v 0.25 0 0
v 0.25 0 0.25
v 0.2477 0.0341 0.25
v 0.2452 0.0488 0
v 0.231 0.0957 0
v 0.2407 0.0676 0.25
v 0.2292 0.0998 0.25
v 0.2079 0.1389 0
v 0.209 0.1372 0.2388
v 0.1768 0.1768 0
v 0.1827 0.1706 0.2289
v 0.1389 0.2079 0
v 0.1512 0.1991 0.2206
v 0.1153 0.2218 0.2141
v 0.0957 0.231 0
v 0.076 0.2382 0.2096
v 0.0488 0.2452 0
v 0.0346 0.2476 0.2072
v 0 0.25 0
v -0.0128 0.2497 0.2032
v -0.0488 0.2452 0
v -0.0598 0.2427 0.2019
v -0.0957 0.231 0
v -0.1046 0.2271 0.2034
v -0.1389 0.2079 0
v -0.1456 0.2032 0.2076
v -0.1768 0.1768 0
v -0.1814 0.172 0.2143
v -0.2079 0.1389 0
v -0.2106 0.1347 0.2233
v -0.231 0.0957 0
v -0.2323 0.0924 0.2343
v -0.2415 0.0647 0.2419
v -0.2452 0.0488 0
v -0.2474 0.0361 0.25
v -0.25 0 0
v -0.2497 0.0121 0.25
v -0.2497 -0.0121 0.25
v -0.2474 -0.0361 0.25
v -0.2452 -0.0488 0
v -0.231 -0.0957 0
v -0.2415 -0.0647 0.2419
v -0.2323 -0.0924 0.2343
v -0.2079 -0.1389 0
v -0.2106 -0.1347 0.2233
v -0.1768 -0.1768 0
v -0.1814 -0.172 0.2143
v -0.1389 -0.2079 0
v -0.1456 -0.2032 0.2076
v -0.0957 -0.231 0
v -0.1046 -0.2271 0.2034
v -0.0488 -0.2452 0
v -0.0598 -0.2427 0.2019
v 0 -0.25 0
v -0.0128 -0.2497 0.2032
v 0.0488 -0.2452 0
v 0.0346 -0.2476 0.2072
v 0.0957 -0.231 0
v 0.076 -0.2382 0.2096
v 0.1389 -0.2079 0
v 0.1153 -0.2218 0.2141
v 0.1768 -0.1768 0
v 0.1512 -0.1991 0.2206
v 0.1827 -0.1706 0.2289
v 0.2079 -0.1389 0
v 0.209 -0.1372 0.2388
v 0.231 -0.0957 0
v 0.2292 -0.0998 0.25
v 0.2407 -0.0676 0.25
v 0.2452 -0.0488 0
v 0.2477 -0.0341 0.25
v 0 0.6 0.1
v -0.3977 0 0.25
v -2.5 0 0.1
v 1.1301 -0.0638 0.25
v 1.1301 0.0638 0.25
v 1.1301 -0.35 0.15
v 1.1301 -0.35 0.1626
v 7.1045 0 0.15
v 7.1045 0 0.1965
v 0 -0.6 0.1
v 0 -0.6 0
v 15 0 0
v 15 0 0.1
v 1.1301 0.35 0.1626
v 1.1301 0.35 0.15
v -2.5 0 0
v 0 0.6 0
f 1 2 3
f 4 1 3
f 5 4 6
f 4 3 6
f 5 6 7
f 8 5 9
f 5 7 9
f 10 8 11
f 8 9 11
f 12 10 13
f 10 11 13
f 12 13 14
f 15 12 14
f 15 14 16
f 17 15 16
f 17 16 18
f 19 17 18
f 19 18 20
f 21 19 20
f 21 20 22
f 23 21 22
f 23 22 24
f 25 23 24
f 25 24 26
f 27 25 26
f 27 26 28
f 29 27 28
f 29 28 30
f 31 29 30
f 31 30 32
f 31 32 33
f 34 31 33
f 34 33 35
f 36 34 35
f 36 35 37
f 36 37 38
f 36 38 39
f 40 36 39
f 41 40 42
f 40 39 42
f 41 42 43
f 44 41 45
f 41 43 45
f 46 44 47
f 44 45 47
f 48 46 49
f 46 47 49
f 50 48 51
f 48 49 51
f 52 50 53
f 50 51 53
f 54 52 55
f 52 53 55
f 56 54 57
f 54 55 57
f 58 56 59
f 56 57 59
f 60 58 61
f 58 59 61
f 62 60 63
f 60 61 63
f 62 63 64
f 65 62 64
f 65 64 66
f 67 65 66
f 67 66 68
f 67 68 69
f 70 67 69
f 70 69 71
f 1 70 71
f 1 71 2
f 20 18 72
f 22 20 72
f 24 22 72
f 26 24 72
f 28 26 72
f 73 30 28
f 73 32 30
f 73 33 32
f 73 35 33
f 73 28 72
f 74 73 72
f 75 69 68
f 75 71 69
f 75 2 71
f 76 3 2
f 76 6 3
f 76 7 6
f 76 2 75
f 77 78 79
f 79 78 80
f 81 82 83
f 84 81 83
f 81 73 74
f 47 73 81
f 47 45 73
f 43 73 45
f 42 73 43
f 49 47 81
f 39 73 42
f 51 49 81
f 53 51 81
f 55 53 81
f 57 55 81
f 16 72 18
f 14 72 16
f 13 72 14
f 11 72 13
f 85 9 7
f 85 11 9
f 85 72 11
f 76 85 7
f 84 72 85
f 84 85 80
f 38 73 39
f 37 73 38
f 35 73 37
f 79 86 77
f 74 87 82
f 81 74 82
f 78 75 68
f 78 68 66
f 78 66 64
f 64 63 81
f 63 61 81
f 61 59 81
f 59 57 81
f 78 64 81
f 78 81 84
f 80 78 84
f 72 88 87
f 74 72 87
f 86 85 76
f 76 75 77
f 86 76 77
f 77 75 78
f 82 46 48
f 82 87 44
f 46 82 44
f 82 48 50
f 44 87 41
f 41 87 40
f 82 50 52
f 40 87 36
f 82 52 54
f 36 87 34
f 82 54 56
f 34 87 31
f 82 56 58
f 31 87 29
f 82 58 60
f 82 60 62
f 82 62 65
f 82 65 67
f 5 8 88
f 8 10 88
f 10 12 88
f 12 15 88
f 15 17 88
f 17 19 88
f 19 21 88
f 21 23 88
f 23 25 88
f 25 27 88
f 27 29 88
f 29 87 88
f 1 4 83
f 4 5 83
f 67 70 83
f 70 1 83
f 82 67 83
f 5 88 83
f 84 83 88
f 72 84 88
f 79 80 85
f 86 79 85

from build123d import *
from OCP.BRepFilletAPI import BRepFilletAPI_MakeChamfer

# Parameters (mm, degrees)
BOSS_EXTRUDE1_DEPTH = 0.25
SKETCH2_R           = 0.25
CUT_EXTRUDE1_DEPTH  = 0.25
CHAMFER2_SIZE       = 0.15
CHAMFER2_SIZE2      = 0.490627893
CUT_EXTRUDE2_DEPTH  = 0.1


with BuildPart() as part:
    # Sketch1 → Boss-Extrude1 (new body)
    with BuildSketch(Plane.XY):
        Polygon((0, 0.6), (-2.5, 0), (0, -0.6), (15, 0), align=None)
    extrude(amount=BOSS_EXTRUDE1_DEPTH)

    # Sketch2 → Cut-Extrude1 (cut)
    with BuildSketch(Plane.XY.offset(0.25)):
        Circle(SKETCH2_R)
    extrude(amount=-CUT_EXTRUDE1_DEPTH, mode=Mode.SUBTRACT)

    # Chamfer1
    # the kernel refuses this chamfer: 0.490627893, 0.15 mm, written as the material it takes off along each edge
    with BuildSketch(Plane(origin=(18.054124469, -0.122164979, 0.25), x_dir=(0.004781856159263962, 0.1195464039815991, -0.9928170985366542), z_dir=(-0.9992009587217895, 0.039968038348871575, 0))) as chamfer1_piece_1:
        with BuildLine():
            Line((0.156864571, 0), (-0.06664171, 0.505050061))
            Line((-0.06664171, 0.505050061), (-0.076383785, 0.503876067))
            ThreePointArc((-0.076383785, 0.503876067), (-0.040214623, 0.251694279), (-0.009742075, -0.001173994))
            Line((-0.009742075, -0.001173994), (0.001173994, -0.009742075))
            ThreePointArc((0.001173994, -0.009742075), (0.078483584, -0.000425682), (0.158038565, -0.009742075))
            Line((0.158038565, -0.009742075), (0.156864571, 0))
        make_face()
    extrude(amount=21.125128788, mode=Mode.SUBTRACT)
    with BuildSketch(Plane(origin=(-3.054124469, -0.722164979, 0.25), x_dir=(-0.039965503065755754, 0.999137576643894, 0.011263281176818171), z_dir=(0.9992009587217895, 0.039968038348871575, 0))) as chamfer1_piece_2:
        with BuildLine():
            Line((0.509427799, 0), (-0.02052052, -0.155516565))
            Line((-0.02052052, -0.155516565), (-0.030332455, -0.155406043))
            ThreePointArc((-0.030332455, -0.155406043), (-0.010688995, -0.077753453), (-0.009811935, 0.000110522))
            Line((-0.009811935, 0.000110522), (0.000110522, 0.009811935))
            ThreePointArc((0.000110522, 0.009811935), (0.254792108, 0.006943203), (0.50953832, 0.009811935))
            Line((0.50953832, 0.009811935), (0.509427799, 0))
        make_face()
    extrude(amount=21.125128788, mode=Mode.SUBTRACT)

    # Chamfer2: one chamfer whose edges measure the first distance from different faces: ONE call of the kernel's chamfer builder (chamfer() names one face for all edges)
    chamfer2_edges_1 = [part.edges().sort_by_distance(p)[0] for p in [
        (-2.126821854, 0.089562755, 0.25),
    ]]
    chamfer2_side_1 = [part.faces().sort_by_distance(p)[0] for p in [
        (-1.427358804, 0.257433887, 0.105010717),
    ]]
    chamfer2_edges_2 = [part.edges().sort_by_distance(p)[0] for p in [
        (-2.126821854, -0.089562755, 0.25),
    ]]
    chamfer2_side_2 = [part.faces().sort_by_distance(p)[0] for p in [
        (-1.427358804, -0.257433887, 0.105010717),
    ]]
    chamfer2 = BRepFilletAPI_MakeChamfer(part.part.solid().wrapped)
    for e in chamfer2_edges_1:
        chamfer2.Add(CHAMFER2_SIZE, CHAMFER2_SIZE2, e.wrapped, chamfer2_side_1[0].wrapped)  # the first distance lies on this face
    for e in chamfer2_edges_2:
        chamfer2.Add(CHAMFER2_SIZE, CHAMFER2_SIZE2, e.wrapped, chamfer2_side_2[0].wrapped)  # the first distance lies on this face
    add(Compound.cast(chamfer2.Shape()), mode=Mode.REPLACE)

    # Sketch3 → Cut-Extrude2 (cut)
    with BuildSketch(Plane.XY.offset(0.25)):
        Polygon((1.130057814, 0.35), (1.130057814, -0.35), (7.104536448, 0), align=None)
    extrude(amount=-CUT_EXTRUDE2_DEPTH, mode=Mode.SUBTRACT)


solid = part.part
